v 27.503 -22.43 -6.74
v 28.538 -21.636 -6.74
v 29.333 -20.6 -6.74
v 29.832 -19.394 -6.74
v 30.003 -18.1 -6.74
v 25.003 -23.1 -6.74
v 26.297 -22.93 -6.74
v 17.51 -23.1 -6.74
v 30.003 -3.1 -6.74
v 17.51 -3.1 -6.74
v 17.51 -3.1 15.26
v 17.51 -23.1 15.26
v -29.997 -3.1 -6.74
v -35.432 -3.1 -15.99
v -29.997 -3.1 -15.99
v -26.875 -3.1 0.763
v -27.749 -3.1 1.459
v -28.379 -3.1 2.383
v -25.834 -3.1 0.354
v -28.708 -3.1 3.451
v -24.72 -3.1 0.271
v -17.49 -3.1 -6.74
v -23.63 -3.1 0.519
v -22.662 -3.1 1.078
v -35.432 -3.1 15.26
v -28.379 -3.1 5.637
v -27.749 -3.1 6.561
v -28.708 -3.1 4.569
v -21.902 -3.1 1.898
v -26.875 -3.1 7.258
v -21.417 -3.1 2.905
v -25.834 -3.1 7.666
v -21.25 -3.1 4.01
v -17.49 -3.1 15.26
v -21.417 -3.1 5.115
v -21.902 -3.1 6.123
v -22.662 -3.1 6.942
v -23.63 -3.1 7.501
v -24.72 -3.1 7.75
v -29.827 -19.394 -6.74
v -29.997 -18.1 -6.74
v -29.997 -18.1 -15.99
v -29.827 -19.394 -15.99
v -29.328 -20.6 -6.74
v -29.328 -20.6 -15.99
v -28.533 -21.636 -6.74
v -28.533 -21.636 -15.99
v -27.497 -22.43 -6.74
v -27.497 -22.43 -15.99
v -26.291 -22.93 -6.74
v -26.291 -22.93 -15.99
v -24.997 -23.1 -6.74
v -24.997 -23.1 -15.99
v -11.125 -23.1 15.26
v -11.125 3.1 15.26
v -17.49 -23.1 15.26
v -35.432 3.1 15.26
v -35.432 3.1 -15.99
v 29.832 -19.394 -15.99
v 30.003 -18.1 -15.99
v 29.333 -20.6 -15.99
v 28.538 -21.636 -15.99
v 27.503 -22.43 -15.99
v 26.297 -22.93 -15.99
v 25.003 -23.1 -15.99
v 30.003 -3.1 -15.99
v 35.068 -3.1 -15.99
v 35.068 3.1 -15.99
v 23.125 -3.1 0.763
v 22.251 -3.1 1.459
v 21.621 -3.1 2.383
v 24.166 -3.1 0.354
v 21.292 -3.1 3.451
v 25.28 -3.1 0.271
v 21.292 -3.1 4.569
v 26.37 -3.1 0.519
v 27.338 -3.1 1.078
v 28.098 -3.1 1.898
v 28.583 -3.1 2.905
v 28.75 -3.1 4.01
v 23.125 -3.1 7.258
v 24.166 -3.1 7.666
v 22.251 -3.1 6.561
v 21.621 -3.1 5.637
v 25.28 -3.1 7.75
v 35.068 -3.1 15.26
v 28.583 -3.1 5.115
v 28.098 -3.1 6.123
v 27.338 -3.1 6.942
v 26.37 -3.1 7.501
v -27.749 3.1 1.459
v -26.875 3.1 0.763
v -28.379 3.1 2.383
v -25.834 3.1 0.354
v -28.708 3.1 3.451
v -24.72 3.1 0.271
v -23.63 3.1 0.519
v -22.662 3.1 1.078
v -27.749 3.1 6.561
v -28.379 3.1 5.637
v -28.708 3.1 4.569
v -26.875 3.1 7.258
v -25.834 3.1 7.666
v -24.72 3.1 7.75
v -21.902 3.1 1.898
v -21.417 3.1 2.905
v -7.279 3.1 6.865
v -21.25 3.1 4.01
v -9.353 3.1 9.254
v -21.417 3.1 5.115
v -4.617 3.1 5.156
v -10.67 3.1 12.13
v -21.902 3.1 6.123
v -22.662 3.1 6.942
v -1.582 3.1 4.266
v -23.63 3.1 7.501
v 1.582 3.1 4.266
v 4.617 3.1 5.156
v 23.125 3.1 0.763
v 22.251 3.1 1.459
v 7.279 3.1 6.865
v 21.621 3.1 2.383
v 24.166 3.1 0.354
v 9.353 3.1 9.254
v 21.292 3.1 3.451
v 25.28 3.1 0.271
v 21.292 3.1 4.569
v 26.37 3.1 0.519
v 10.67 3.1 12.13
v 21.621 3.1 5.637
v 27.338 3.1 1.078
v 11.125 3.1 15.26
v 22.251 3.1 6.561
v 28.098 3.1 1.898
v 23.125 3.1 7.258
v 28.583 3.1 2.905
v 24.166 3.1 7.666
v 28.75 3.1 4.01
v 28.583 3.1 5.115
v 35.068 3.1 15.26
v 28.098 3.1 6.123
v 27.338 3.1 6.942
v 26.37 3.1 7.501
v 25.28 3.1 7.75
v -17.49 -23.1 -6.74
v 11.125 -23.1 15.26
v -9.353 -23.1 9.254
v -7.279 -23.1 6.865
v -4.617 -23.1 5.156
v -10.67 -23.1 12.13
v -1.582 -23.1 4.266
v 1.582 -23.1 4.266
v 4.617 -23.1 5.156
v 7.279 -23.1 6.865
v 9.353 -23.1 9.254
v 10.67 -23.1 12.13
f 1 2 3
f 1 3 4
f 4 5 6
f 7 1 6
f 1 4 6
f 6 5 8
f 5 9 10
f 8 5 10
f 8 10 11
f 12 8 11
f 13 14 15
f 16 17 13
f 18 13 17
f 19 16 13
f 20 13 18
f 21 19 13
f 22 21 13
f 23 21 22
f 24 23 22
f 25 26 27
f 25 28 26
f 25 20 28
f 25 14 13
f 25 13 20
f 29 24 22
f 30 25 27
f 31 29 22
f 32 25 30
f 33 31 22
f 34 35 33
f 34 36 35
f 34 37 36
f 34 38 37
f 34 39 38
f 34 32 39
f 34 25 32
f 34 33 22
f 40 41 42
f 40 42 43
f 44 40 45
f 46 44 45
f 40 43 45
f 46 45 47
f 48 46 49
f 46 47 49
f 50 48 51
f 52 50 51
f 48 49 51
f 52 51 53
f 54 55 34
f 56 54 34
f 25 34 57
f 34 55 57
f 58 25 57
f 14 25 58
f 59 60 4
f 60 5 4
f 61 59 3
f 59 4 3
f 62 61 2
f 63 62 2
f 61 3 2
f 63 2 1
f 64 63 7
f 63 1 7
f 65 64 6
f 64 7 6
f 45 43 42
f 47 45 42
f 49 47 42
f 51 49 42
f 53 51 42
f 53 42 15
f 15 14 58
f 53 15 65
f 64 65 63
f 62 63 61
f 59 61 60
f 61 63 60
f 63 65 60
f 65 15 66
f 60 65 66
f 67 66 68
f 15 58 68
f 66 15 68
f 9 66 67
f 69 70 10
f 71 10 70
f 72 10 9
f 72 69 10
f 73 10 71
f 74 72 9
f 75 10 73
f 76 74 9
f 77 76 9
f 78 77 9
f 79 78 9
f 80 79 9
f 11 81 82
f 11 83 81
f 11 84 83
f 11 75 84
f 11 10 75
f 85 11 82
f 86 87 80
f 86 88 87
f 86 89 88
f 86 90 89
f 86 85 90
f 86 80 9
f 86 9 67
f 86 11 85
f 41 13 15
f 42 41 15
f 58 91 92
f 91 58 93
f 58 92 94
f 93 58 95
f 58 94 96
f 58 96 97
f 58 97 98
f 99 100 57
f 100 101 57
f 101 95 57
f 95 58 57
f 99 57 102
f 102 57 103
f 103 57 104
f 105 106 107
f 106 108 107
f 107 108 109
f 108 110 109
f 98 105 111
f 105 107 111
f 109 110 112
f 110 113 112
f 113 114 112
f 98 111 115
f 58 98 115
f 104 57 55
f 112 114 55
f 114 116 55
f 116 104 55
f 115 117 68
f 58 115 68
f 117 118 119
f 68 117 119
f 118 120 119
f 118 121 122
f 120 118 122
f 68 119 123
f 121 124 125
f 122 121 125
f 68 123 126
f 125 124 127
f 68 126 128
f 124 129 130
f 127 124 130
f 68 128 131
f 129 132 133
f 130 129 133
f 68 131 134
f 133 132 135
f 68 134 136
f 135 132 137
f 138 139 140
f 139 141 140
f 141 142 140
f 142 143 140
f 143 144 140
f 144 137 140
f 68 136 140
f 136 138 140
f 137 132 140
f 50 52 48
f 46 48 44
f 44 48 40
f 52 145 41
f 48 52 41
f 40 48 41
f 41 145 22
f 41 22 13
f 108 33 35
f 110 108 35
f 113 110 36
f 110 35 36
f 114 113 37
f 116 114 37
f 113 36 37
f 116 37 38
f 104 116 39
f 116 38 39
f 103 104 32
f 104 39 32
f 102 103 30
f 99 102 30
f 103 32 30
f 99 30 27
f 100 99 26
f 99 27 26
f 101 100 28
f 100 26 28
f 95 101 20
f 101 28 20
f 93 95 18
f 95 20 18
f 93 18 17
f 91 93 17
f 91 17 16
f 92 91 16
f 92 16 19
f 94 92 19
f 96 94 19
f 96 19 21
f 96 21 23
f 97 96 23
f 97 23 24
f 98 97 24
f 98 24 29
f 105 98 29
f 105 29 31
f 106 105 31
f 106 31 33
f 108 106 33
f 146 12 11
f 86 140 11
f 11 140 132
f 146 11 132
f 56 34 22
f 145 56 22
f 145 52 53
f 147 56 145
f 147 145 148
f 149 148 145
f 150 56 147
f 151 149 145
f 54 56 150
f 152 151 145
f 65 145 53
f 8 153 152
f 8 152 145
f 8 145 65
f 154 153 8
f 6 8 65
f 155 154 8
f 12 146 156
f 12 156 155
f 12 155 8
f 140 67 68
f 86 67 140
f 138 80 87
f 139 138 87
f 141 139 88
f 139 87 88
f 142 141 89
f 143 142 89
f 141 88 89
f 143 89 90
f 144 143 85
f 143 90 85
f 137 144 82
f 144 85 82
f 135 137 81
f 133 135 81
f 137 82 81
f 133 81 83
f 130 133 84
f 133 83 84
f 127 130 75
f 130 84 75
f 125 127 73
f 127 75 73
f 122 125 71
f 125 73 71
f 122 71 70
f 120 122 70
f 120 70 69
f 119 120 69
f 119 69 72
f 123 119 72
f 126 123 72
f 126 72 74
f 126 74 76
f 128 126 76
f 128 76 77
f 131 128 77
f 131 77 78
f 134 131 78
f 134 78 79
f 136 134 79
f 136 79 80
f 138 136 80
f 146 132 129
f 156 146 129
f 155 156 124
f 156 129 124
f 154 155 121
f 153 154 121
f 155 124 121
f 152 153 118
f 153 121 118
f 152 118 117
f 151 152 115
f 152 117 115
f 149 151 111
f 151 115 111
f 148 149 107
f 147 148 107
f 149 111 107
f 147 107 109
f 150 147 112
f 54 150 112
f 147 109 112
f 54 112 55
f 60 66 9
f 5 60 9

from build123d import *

# Parameters (mm, degrees)
F1_DEPTH = 3.1
F3_DEPTH = 20
F4_R     = 5
F5_R     = 3.75
F6_DEPTH = 25.4


with BuildPart() as f1:
    # F0 (on Front) → F1 (new body, symmetric)
    with BuildSketch(Plane.XZ):
        with BuildLine():
            Line((-35.43221, 15.260131), (-35.43221, -15.989869))
            Line((-35.43221, -15.989869), (35.06779, -15.989869))
            Line((35.06779, -15.989869), (35.06779, 15.260131))
            Line((35.06779, 15.260131), (11.124986, 15.260131))
            ThreePointArc((11.124986, 15.260131), (0, 4.152949), (-11.124986, 15.260131))
            Line((-11.124986, 15.260131), (-35.43221, 15.260131))
        make_face()
    extrude(amount=F1_DEPTH, both=True)

    # F2 (on face) → F3 (join)
    with BuildSketch(Plane.XZ.offset(3.1)):
        with BuildLine():
            Line((-11.124986, 15.260131), (-17.490178, 15.260131))
            Line((-17.490178, 15.260131), (-17.490178, -6.739869))
            Line((-17.490178, -6.739869), (-29.9974, -6.739869))
            Line((-29.9974, -6.739869), (-29.9974, -15.989869))
            Line((-29.9974, -15.989869), (30.0026, -15.989869))
            Line((30.0026, -15.989869), (30.0026, -6.739869))
            Line((30.0026, -6.739869), (17.509822, -6.739869))
            Line((17.509822, -6.739869), (17.509822, 15.260131))
            Line((17.509822, 15.260131), (11.124986, 15.260131))
            ThreePointArc((11.124986, 15.260131), (0, 4.152949), (-11.124986, 15.260131))
        make_face()
    extrude(amount=F3_DEPTH)

    # F4
    f4_edges = [f1.edges().sort_by_distance(p)[0] for p in [
        (-29.9974, -23.1, -11.364869),
        (30.0026, -23.1, -11.364869),
    ]]
    fillet(f4_edges, radius=F4_R)

    # F5 (on face) → F6 (cut)
    with BuildSketch(Plane.XZ.offset(3.1)):
        with Locations((-25, 4.010131)):
            Circle(F5_R)
        with Locations((25, 4.010131)):
            Circle(F5_R)
    extrude(amount=-F6_DEPTH, mode=Mode.SUBTRACT)


solid = f1.part
